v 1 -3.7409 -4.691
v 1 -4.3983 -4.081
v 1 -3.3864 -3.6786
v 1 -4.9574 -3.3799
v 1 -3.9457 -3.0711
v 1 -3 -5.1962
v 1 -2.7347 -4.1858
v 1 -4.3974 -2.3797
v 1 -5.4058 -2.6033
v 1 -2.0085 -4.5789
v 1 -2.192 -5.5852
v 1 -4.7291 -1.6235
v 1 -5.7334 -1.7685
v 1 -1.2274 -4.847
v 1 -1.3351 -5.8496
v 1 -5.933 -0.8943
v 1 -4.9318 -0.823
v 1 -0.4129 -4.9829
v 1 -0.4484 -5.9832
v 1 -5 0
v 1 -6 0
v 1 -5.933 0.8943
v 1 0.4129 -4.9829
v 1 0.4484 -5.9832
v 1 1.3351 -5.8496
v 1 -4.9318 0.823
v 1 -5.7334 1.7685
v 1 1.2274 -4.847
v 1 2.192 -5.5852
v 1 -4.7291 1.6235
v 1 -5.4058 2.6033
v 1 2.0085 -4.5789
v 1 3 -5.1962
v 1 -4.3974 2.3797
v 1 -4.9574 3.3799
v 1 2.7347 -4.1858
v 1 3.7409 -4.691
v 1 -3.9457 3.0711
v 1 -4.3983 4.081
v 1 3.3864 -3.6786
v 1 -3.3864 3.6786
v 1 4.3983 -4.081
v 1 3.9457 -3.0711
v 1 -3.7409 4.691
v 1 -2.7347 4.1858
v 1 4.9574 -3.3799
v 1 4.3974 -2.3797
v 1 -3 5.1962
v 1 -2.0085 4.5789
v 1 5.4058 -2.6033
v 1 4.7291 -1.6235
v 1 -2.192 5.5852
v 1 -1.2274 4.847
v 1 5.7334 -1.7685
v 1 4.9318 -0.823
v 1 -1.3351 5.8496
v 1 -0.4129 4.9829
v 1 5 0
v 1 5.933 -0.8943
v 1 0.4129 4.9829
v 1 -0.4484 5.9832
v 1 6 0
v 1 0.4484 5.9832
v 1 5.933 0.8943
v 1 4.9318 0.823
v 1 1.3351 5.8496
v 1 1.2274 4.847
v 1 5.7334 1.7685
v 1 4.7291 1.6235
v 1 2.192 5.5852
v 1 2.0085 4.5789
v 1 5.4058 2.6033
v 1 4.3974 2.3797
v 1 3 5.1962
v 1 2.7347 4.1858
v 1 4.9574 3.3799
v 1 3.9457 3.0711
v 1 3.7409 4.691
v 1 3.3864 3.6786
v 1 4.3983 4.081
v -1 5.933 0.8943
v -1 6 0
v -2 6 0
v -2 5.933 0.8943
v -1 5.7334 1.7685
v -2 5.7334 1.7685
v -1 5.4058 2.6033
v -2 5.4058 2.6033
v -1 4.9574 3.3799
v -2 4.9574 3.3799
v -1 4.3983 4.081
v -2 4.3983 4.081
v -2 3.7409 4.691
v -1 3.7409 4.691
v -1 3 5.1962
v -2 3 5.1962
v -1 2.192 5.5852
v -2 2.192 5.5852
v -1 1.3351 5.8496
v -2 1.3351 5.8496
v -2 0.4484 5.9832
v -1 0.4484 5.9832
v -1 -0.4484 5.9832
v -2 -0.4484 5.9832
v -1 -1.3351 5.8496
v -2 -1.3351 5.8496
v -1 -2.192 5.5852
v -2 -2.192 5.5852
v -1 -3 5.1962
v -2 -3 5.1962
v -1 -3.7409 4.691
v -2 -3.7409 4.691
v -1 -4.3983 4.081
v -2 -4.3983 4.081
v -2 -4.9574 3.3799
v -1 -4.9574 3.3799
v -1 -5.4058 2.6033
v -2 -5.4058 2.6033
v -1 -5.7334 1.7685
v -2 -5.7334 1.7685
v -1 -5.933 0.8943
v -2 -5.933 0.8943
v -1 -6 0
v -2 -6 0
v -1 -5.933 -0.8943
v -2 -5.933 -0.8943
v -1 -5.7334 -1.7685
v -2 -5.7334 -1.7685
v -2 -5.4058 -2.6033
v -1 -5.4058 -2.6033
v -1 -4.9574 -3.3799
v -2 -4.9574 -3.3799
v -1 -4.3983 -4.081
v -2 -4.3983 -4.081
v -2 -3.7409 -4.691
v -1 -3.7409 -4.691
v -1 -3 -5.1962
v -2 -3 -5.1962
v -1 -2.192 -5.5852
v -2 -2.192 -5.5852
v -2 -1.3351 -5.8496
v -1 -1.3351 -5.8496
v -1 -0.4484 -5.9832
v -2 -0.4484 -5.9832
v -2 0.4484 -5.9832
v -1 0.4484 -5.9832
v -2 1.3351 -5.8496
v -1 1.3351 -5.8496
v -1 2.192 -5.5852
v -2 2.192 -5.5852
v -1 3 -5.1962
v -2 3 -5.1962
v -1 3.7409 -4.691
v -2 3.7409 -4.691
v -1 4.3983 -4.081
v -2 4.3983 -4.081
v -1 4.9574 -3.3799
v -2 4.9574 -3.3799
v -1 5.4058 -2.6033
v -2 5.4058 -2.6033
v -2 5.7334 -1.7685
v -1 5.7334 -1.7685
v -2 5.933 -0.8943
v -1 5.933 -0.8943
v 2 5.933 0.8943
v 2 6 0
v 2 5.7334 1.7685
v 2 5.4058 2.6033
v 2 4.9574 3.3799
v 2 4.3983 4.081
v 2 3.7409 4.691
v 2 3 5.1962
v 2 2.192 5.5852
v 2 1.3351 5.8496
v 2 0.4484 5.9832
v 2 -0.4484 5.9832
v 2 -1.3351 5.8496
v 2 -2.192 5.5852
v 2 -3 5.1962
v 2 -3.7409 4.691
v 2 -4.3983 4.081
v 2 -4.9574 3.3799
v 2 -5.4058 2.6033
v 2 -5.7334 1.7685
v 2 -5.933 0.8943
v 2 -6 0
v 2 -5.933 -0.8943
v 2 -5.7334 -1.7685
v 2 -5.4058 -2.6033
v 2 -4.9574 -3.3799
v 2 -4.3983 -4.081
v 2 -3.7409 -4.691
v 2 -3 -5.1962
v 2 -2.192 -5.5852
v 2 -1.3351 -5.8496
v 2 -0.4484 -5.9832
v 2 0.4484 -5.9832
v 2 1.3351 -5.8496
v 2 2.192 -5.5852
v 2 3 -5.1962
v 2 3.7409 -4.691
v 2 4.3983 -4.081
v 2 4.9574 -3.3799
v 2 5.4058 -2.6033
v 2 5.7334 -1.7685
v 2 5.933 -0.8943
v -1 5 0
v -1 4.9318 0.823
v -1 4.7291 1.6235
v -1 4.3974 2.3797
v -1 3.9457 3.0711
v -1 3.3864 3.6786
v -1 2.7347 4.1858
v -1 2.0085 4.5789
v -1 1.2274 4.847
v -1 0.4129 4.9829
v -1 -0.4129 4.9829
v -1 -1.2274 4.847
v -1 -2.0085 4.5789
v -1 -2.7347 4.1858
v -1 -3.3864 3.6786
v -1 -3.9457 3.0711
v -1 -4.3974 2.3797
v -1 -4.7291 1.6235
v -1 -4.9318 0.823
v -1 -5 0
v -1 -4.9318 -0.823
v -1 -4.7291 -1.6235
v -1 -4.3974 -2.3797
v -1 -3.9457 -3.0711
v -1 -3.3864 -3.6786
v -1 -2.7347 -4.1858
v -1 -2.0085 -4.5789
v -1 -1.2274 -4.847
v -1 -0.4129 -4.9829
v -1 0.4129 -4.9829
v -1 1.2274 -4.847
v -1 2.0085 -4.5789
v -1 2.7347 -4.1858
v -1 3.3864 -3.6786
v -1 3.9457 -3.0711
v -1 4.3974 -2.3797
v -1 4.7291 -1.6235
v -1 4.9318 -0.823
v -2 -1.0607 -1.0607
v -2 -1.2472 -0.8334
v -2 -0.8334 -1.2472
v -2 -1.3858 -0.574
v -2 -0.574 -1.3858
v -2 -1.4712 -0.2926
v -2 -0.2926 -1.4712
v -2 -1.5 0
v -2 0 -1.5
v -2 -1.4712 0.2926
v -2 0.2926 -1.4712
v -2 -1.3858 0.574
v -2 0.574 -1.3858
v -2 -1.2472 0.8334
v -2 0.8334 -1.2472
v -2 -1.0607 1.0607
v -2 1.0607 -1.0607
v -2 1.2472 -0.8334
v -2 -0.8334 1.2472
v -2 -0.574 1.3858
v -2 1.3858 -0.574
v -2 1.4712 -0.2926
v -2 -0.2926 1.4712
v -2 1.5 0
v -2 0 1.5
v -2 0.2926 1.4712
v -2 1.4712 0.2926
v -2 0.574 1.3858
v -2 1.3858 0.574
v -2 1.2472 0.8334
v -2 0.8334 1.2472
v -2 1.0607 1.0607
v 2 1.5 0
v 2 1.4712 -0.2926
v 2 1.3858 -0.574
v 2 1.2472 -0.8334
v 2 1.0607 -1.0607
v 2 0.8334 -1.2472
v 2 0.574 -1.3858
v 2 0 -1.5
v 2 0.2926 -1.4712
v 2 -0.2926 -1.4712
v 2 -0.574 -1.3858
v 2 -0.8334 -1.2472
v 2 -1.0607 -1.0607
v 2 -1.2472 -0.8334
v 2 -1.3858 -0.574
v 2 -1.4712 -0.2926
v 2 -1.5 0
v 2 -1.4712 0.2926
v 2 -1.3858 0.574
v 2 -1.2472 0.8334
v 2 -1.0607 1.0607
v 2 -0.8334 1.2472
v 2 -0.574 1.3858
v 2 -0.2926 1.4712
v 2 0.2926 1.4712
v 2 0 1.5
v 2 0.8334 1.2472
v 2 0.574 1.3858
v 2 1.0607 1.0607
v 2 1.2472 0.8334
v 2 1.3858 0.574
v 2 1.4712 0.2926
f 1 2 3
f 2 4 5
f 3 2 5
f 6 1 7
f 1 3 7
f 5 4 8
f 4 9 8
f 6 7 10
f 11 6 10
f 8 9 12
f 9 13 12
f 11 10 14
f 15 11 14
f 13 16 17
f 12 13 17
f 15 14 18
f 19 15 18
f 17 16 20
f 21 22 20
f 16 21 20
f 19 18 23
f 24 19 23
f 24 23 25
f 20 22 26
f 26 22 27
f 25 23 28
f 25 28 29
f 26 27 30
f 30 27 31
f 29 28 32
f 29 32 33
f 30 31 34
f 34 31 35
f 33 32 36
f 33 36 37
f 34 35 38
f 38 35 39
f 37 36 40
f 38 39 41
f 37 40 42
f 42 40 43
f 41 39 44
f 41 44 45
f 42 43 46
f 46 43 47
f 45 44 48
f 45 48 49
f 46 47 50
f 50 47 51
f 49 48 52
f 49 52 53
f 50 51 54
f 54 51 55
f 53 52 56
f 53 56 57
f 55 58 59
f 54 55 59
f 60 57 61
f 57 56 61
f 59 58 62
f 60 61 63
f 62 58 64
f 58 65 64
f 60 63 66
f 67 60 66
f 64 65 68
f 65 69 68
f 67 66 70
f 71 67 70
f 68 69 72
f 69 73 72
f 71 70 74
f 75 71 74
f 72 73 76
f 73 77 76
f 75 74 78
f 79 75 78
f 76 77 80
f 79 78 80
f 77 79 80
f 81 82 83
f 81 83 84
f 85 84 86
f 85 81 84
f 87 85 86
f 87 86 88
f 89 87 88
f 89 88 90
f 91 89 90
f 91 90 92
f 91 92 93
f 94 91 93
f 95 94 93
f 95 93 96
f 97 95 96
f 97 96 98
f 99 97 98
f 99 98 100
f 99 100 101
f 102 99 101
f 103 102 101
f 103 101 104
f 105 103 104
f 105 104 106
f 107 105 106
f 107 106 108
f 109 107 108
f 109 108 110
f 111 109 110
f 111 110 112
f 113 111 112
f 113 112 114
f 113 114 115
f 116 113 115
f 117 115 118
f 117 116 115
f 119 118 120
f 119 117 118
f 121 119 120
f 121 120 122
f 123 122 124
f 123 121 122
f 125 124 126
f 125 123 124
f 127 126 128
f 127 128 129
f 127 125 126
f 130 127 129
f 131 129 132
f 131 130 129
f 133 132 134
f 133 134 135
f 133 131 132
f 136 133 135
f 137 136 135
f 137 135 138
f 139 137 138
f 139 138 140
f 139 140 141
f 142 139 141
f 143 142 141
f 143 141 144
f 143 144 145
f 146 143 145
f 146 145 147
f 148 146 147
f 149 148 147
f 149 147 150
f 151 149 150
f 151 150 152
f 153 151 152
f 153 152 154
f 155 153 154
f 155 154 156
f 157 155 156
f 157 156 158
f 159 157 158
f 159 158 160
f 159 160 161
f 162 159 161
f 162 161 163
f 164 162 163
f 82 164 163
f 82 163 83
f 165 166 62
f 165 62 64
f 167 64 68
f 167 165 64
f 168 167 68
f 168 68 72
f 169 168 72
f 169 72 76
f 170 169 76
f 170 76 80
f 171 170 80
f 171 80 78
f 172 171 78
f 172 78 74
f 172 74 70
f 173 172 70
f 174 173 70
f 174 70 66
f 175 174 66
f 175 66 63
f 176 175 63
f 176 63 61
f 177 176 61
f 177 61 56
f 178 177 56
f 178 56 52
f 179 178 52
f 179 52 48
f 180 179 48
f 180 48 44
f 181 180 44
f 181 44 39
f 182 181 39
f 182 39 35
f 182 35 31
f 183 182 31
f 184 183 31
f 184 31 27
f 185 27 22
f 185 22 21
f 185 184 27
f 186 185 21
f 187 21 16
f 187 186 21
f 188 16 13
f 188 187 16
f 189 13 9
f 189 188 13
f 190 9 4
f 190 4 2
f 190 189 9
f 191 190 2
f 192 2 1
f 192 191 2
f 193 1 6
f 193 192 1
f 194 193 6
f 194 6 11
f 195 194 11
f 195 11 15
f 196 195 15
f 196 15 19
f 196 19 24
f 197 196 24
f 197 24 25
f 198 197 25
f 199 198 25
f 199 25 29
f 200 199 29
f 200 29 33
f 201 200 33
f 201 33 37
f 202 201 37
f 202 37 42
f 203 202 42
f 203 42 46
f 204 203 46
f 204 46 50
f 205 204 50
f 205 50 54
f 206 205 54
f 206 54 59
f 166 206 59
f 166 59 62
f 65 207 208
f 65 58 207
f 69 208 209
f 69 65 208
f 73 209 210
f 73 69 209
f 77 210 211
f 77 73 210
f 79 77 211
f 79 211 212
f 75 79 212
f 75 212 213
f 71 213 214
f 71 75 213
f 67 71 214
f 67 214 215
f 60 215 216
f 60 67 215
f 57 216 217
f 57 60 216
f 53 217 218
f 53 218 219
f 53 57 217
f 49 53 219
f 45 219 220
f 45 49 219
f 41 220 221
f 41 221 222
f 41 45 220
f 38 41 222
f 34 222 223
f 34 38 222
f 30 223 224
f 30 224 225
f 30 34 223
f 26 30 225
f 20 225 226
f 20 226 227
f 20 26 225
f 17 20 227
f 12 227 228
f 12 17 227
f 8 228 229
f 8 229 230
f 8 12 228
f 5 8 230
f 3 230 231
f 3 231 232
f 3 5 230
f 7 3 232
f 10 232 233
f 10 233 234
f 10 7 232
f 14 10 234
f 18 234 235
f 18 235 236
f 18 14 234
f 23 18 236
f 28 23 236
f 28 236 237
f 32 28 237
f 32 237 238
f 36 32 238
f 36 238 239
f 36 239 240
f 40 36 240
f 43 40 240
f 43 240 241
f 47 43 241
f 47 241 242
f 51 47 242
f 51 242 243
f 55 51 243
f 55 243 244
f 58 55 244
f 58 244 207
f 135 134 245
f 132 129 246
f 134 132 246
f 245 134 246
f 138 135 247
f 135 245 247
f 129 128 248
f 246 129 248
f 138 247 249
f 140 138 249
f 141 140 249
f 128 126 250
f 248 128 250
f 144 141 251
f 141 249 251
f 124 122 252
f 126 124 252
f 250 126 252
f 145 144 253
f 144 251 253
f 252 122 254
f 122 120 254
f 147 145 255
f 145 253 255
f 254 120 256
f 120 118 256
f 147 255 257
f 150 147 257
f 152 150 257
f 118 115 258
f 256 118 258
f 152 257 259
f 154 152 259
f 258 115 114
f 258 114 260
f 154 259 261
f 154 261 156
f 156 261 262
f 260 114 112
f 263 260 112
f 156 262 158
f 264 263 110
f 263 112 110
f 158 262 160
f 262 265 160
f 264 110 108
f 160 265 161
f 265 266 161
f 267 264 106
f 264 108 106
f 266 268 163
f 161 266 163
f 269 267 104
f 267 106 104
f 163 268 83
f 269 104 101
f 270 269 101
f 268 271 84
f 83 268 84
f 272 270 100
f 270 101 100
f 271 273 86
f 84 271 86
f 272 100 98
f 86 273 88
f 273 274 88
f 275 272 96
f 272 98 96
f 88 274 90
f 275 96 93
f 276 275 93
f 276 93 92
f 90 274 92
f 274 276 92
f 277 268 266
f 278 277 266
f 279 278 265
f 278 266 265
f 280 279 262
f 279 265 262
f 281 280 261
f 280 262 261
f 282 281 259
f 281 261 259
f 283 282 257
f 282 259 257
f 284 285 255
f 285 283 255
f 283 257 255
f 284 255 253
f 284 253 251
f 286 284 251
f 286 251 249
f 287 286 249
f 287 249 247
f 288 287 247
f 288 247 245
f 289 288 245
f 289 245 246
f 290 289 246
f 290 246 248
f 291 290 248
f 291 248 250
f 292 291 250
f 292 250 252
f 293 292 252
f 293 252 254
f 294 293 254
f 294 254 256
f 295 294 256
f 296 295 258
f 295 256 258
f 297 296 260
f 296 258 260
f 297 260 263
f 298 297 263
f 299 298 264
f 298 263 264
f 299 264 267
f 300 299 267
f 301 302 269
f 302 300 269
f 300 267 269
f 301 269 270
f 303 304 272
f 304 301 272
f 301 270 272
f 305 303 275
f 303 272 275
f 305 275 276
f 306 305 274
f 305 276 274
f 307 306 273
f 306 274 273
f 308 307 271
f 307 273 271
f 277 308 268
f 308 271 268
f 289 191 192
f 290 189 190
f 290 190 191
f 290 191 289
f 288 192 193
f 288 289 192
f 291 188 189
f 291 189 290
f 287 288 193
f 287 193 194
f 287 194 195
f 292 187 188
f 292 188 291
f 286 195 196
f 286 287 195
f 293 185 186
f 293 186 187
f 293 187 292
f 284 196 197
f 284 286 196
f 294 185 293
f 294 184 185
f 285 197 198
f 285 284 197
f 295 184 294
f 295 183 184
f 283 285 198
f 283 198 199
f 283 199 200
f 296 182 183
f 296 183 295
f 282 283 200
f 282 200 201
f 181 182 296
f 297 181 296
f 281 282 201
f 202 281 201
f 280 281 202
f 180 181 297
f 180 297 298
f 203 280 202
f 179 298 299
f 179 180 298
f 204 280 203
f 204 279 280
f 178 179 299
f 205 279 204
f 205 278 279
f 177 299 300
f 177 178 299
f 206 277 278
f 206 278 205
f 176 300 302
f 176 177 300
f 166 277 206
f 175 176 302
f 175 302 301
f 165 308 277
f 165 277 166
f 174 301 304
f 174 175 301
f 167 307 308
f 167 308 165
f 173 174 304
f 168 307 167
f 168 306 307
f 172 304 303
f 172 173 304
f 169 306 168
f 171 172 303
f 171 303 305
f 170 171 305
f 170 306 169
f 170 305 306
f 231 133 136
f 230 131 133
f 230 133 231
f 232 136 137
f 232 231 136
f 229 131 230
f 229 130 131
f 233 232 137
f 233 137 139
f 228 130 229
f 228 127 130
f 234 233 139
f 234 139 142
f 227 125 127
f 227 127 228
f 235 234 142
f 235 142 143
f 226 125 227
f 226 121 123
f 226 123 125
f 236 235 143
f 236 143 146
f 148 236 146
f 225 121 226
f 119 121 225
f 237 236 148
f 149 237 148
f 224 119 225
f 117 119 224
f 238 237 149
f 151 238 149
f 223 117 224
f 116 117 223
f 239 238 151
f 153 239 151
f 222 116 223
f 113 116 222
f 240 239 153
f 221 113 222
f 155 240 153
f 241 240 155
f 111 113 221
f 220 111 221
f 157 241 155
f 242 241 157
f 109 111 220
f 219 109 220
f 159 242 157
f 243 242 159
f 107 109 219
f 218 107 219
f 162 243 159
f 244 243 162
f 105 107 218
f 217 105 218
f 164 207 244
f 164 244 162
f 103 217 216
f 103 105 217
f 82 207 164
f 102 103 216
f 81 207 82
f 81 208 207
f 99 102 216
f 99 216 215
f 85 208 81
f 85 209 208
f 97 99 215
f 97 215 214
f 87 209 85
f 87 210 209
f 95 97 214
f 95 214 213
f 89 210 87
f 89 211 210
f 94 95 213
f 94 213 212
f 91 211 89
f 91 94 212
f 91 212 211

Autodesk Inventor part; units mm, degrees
ref_plane "YZ Plane" through (0, 0, 0) normal (1, 0, 0) x (0, 1, 0)
ref_plane "XZ Plane" through (0, 0, 0) normal (0, 1, 0) x (-1, 0, 0)
ref_plane "XY Plane" through (0, 0, 0) normal (0, 0, 1) x (1, 0, 0)
sketch "スケッチ1" plane through (0, 0, 0) normal (0, 0, 1) x (1, 0, 0)
  line L0 (-2, 6) -> (-1, 6)
  line L1 (-1, 6) -> (-1, 5)
  line L2 (-1, 5) -> (1, 5)
  line L3 (1, 5) -> (1, 6)
  line L4 (1, 6) -> (2, 6)
  line L5 (2, 6) -> (2, 1.5)
  line L6 (2, 1.5) -> (-2, 1.5)
  line L7 (-2, 1.5) -> (-2, 6)
  line L8 (0, -1.2) -> (0, 7.2) construction
  line L9 (-2.8, 0) -> (2.8, 0) projected
  point P0 (0, 0)
  dimension "d0" = 1.5
  dimension "d1" = 5
  dimension "d2" = 1
  dimension "d3" = 2
  dimension "d4" = 1
revolve "回転1" add sketch "スケッチ1" angle 360 about axis through (-10, 0, 0) along (1, 0, 0)
properties part number "Pulley_L"
